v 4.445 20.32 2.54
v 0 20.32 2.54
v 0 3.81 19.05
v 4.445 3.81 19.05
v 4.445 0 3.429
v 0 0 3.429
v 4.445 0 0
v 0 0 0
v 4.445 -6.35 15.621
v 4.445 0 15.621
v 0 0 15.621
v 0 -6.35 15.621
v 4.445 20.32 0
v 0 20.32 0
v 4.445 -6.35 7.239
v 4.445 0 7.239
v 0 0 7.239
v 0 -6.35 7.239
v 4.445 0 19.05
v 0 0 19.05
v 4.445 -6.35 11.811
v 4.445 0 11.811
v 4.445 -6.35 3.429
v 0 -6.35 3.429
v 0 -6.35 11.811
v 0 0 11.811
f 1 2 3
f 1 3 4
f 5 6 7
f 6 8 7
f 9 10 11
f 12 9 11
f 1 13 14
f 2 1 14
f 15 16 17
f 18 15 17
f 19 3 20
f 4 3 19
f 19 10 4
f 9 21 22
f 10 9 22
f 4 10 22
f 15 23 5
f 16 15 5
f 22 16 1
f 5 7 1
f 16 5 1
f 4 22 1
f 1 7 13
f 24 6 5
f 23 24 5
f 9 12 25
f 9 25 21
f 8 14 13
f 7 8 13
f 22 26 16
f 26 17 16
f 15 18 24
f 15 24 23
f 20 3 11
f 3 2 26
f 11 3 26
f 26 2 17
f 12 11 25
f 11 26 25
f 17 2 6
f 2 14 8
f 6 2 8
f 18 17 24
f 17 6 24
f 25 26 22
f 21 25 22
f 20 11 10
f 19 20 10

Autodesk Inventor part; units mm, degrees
ref_plane "YZ Plane" through (0, 0, 0) normal (1, 0, 0) x (0, 1, 0)
ref_plane "XZ Plane" through (0, 0, 0) normal (0, 1, 0) x (-1, 0, 0)
ref_plane "XY Plane" through (0, 0, 0) normal (0, 0, 1) x (1, 0, 0)
sketch "Sketch1" plane through (0, 0, 0) normal (0, 0, 1) x (1, 0, 0)
  line L0 (0, 0) -> (4.445, 0)
  line L1 (4.445, 0) -> (4.445, 20.32)
  line L2 (4.445, 20.32) -> (0, 20.32)
  line L3 (0, 20.32) -> (0, 0)
  dimension "d0" = 4.445
  dimension "d1" = 20.32
extrude "Extrusion1" add sketch "Sketch1" along normal blind 19.05
chamfer "Chamfer1" distance 16.51 angle 45 1 edges at (2.2225, 20.32, 19.05)
sketch "Sketch2" plane through (0, 0, 0) normal (0, -1, 0) x (1, 0, 0)
  line L0 (0, 19.05) -> (4.445, 19.05) projected
  line L1 (0, 0) -> (4.445, 0) projected
  line L2 (0, 3.429) -> (4.445, 3.429)
  line L3 (4.445, 3.429) -> (4.445, 7.239)
  line L4 (4.445, 7.239) -> (0, 7.239)
  line L5 (0, 7.239) -> (0, 3.429)
  line L6 (4.445, 0) -> (4.445, 19.05) projected
  line L7 (0, 11.811) -> (4.445, 11.811)
  line L8 (4.445, 11.811) -> (4.445, 15.621)
  line L9 (4.445, 15.621) -> (0, 15.621)
  line L10 (0, 15.621) -> (0, 11.811)
  dimension "d7" = 19.05
  dimension "d8" = 3.81
  dimension "d9" = 3.81
  dimension "d10" = 4.445
  dimension "d11" = 4.445
  dimension "d12" = 3.429
  dimension "d13" = 3.429
  dimension "d16" = 8.382
extrude "Extrusion2" add sketch "Sketch2" along normal blind 6.35
properties part number "MonsterHolderSupport1"
